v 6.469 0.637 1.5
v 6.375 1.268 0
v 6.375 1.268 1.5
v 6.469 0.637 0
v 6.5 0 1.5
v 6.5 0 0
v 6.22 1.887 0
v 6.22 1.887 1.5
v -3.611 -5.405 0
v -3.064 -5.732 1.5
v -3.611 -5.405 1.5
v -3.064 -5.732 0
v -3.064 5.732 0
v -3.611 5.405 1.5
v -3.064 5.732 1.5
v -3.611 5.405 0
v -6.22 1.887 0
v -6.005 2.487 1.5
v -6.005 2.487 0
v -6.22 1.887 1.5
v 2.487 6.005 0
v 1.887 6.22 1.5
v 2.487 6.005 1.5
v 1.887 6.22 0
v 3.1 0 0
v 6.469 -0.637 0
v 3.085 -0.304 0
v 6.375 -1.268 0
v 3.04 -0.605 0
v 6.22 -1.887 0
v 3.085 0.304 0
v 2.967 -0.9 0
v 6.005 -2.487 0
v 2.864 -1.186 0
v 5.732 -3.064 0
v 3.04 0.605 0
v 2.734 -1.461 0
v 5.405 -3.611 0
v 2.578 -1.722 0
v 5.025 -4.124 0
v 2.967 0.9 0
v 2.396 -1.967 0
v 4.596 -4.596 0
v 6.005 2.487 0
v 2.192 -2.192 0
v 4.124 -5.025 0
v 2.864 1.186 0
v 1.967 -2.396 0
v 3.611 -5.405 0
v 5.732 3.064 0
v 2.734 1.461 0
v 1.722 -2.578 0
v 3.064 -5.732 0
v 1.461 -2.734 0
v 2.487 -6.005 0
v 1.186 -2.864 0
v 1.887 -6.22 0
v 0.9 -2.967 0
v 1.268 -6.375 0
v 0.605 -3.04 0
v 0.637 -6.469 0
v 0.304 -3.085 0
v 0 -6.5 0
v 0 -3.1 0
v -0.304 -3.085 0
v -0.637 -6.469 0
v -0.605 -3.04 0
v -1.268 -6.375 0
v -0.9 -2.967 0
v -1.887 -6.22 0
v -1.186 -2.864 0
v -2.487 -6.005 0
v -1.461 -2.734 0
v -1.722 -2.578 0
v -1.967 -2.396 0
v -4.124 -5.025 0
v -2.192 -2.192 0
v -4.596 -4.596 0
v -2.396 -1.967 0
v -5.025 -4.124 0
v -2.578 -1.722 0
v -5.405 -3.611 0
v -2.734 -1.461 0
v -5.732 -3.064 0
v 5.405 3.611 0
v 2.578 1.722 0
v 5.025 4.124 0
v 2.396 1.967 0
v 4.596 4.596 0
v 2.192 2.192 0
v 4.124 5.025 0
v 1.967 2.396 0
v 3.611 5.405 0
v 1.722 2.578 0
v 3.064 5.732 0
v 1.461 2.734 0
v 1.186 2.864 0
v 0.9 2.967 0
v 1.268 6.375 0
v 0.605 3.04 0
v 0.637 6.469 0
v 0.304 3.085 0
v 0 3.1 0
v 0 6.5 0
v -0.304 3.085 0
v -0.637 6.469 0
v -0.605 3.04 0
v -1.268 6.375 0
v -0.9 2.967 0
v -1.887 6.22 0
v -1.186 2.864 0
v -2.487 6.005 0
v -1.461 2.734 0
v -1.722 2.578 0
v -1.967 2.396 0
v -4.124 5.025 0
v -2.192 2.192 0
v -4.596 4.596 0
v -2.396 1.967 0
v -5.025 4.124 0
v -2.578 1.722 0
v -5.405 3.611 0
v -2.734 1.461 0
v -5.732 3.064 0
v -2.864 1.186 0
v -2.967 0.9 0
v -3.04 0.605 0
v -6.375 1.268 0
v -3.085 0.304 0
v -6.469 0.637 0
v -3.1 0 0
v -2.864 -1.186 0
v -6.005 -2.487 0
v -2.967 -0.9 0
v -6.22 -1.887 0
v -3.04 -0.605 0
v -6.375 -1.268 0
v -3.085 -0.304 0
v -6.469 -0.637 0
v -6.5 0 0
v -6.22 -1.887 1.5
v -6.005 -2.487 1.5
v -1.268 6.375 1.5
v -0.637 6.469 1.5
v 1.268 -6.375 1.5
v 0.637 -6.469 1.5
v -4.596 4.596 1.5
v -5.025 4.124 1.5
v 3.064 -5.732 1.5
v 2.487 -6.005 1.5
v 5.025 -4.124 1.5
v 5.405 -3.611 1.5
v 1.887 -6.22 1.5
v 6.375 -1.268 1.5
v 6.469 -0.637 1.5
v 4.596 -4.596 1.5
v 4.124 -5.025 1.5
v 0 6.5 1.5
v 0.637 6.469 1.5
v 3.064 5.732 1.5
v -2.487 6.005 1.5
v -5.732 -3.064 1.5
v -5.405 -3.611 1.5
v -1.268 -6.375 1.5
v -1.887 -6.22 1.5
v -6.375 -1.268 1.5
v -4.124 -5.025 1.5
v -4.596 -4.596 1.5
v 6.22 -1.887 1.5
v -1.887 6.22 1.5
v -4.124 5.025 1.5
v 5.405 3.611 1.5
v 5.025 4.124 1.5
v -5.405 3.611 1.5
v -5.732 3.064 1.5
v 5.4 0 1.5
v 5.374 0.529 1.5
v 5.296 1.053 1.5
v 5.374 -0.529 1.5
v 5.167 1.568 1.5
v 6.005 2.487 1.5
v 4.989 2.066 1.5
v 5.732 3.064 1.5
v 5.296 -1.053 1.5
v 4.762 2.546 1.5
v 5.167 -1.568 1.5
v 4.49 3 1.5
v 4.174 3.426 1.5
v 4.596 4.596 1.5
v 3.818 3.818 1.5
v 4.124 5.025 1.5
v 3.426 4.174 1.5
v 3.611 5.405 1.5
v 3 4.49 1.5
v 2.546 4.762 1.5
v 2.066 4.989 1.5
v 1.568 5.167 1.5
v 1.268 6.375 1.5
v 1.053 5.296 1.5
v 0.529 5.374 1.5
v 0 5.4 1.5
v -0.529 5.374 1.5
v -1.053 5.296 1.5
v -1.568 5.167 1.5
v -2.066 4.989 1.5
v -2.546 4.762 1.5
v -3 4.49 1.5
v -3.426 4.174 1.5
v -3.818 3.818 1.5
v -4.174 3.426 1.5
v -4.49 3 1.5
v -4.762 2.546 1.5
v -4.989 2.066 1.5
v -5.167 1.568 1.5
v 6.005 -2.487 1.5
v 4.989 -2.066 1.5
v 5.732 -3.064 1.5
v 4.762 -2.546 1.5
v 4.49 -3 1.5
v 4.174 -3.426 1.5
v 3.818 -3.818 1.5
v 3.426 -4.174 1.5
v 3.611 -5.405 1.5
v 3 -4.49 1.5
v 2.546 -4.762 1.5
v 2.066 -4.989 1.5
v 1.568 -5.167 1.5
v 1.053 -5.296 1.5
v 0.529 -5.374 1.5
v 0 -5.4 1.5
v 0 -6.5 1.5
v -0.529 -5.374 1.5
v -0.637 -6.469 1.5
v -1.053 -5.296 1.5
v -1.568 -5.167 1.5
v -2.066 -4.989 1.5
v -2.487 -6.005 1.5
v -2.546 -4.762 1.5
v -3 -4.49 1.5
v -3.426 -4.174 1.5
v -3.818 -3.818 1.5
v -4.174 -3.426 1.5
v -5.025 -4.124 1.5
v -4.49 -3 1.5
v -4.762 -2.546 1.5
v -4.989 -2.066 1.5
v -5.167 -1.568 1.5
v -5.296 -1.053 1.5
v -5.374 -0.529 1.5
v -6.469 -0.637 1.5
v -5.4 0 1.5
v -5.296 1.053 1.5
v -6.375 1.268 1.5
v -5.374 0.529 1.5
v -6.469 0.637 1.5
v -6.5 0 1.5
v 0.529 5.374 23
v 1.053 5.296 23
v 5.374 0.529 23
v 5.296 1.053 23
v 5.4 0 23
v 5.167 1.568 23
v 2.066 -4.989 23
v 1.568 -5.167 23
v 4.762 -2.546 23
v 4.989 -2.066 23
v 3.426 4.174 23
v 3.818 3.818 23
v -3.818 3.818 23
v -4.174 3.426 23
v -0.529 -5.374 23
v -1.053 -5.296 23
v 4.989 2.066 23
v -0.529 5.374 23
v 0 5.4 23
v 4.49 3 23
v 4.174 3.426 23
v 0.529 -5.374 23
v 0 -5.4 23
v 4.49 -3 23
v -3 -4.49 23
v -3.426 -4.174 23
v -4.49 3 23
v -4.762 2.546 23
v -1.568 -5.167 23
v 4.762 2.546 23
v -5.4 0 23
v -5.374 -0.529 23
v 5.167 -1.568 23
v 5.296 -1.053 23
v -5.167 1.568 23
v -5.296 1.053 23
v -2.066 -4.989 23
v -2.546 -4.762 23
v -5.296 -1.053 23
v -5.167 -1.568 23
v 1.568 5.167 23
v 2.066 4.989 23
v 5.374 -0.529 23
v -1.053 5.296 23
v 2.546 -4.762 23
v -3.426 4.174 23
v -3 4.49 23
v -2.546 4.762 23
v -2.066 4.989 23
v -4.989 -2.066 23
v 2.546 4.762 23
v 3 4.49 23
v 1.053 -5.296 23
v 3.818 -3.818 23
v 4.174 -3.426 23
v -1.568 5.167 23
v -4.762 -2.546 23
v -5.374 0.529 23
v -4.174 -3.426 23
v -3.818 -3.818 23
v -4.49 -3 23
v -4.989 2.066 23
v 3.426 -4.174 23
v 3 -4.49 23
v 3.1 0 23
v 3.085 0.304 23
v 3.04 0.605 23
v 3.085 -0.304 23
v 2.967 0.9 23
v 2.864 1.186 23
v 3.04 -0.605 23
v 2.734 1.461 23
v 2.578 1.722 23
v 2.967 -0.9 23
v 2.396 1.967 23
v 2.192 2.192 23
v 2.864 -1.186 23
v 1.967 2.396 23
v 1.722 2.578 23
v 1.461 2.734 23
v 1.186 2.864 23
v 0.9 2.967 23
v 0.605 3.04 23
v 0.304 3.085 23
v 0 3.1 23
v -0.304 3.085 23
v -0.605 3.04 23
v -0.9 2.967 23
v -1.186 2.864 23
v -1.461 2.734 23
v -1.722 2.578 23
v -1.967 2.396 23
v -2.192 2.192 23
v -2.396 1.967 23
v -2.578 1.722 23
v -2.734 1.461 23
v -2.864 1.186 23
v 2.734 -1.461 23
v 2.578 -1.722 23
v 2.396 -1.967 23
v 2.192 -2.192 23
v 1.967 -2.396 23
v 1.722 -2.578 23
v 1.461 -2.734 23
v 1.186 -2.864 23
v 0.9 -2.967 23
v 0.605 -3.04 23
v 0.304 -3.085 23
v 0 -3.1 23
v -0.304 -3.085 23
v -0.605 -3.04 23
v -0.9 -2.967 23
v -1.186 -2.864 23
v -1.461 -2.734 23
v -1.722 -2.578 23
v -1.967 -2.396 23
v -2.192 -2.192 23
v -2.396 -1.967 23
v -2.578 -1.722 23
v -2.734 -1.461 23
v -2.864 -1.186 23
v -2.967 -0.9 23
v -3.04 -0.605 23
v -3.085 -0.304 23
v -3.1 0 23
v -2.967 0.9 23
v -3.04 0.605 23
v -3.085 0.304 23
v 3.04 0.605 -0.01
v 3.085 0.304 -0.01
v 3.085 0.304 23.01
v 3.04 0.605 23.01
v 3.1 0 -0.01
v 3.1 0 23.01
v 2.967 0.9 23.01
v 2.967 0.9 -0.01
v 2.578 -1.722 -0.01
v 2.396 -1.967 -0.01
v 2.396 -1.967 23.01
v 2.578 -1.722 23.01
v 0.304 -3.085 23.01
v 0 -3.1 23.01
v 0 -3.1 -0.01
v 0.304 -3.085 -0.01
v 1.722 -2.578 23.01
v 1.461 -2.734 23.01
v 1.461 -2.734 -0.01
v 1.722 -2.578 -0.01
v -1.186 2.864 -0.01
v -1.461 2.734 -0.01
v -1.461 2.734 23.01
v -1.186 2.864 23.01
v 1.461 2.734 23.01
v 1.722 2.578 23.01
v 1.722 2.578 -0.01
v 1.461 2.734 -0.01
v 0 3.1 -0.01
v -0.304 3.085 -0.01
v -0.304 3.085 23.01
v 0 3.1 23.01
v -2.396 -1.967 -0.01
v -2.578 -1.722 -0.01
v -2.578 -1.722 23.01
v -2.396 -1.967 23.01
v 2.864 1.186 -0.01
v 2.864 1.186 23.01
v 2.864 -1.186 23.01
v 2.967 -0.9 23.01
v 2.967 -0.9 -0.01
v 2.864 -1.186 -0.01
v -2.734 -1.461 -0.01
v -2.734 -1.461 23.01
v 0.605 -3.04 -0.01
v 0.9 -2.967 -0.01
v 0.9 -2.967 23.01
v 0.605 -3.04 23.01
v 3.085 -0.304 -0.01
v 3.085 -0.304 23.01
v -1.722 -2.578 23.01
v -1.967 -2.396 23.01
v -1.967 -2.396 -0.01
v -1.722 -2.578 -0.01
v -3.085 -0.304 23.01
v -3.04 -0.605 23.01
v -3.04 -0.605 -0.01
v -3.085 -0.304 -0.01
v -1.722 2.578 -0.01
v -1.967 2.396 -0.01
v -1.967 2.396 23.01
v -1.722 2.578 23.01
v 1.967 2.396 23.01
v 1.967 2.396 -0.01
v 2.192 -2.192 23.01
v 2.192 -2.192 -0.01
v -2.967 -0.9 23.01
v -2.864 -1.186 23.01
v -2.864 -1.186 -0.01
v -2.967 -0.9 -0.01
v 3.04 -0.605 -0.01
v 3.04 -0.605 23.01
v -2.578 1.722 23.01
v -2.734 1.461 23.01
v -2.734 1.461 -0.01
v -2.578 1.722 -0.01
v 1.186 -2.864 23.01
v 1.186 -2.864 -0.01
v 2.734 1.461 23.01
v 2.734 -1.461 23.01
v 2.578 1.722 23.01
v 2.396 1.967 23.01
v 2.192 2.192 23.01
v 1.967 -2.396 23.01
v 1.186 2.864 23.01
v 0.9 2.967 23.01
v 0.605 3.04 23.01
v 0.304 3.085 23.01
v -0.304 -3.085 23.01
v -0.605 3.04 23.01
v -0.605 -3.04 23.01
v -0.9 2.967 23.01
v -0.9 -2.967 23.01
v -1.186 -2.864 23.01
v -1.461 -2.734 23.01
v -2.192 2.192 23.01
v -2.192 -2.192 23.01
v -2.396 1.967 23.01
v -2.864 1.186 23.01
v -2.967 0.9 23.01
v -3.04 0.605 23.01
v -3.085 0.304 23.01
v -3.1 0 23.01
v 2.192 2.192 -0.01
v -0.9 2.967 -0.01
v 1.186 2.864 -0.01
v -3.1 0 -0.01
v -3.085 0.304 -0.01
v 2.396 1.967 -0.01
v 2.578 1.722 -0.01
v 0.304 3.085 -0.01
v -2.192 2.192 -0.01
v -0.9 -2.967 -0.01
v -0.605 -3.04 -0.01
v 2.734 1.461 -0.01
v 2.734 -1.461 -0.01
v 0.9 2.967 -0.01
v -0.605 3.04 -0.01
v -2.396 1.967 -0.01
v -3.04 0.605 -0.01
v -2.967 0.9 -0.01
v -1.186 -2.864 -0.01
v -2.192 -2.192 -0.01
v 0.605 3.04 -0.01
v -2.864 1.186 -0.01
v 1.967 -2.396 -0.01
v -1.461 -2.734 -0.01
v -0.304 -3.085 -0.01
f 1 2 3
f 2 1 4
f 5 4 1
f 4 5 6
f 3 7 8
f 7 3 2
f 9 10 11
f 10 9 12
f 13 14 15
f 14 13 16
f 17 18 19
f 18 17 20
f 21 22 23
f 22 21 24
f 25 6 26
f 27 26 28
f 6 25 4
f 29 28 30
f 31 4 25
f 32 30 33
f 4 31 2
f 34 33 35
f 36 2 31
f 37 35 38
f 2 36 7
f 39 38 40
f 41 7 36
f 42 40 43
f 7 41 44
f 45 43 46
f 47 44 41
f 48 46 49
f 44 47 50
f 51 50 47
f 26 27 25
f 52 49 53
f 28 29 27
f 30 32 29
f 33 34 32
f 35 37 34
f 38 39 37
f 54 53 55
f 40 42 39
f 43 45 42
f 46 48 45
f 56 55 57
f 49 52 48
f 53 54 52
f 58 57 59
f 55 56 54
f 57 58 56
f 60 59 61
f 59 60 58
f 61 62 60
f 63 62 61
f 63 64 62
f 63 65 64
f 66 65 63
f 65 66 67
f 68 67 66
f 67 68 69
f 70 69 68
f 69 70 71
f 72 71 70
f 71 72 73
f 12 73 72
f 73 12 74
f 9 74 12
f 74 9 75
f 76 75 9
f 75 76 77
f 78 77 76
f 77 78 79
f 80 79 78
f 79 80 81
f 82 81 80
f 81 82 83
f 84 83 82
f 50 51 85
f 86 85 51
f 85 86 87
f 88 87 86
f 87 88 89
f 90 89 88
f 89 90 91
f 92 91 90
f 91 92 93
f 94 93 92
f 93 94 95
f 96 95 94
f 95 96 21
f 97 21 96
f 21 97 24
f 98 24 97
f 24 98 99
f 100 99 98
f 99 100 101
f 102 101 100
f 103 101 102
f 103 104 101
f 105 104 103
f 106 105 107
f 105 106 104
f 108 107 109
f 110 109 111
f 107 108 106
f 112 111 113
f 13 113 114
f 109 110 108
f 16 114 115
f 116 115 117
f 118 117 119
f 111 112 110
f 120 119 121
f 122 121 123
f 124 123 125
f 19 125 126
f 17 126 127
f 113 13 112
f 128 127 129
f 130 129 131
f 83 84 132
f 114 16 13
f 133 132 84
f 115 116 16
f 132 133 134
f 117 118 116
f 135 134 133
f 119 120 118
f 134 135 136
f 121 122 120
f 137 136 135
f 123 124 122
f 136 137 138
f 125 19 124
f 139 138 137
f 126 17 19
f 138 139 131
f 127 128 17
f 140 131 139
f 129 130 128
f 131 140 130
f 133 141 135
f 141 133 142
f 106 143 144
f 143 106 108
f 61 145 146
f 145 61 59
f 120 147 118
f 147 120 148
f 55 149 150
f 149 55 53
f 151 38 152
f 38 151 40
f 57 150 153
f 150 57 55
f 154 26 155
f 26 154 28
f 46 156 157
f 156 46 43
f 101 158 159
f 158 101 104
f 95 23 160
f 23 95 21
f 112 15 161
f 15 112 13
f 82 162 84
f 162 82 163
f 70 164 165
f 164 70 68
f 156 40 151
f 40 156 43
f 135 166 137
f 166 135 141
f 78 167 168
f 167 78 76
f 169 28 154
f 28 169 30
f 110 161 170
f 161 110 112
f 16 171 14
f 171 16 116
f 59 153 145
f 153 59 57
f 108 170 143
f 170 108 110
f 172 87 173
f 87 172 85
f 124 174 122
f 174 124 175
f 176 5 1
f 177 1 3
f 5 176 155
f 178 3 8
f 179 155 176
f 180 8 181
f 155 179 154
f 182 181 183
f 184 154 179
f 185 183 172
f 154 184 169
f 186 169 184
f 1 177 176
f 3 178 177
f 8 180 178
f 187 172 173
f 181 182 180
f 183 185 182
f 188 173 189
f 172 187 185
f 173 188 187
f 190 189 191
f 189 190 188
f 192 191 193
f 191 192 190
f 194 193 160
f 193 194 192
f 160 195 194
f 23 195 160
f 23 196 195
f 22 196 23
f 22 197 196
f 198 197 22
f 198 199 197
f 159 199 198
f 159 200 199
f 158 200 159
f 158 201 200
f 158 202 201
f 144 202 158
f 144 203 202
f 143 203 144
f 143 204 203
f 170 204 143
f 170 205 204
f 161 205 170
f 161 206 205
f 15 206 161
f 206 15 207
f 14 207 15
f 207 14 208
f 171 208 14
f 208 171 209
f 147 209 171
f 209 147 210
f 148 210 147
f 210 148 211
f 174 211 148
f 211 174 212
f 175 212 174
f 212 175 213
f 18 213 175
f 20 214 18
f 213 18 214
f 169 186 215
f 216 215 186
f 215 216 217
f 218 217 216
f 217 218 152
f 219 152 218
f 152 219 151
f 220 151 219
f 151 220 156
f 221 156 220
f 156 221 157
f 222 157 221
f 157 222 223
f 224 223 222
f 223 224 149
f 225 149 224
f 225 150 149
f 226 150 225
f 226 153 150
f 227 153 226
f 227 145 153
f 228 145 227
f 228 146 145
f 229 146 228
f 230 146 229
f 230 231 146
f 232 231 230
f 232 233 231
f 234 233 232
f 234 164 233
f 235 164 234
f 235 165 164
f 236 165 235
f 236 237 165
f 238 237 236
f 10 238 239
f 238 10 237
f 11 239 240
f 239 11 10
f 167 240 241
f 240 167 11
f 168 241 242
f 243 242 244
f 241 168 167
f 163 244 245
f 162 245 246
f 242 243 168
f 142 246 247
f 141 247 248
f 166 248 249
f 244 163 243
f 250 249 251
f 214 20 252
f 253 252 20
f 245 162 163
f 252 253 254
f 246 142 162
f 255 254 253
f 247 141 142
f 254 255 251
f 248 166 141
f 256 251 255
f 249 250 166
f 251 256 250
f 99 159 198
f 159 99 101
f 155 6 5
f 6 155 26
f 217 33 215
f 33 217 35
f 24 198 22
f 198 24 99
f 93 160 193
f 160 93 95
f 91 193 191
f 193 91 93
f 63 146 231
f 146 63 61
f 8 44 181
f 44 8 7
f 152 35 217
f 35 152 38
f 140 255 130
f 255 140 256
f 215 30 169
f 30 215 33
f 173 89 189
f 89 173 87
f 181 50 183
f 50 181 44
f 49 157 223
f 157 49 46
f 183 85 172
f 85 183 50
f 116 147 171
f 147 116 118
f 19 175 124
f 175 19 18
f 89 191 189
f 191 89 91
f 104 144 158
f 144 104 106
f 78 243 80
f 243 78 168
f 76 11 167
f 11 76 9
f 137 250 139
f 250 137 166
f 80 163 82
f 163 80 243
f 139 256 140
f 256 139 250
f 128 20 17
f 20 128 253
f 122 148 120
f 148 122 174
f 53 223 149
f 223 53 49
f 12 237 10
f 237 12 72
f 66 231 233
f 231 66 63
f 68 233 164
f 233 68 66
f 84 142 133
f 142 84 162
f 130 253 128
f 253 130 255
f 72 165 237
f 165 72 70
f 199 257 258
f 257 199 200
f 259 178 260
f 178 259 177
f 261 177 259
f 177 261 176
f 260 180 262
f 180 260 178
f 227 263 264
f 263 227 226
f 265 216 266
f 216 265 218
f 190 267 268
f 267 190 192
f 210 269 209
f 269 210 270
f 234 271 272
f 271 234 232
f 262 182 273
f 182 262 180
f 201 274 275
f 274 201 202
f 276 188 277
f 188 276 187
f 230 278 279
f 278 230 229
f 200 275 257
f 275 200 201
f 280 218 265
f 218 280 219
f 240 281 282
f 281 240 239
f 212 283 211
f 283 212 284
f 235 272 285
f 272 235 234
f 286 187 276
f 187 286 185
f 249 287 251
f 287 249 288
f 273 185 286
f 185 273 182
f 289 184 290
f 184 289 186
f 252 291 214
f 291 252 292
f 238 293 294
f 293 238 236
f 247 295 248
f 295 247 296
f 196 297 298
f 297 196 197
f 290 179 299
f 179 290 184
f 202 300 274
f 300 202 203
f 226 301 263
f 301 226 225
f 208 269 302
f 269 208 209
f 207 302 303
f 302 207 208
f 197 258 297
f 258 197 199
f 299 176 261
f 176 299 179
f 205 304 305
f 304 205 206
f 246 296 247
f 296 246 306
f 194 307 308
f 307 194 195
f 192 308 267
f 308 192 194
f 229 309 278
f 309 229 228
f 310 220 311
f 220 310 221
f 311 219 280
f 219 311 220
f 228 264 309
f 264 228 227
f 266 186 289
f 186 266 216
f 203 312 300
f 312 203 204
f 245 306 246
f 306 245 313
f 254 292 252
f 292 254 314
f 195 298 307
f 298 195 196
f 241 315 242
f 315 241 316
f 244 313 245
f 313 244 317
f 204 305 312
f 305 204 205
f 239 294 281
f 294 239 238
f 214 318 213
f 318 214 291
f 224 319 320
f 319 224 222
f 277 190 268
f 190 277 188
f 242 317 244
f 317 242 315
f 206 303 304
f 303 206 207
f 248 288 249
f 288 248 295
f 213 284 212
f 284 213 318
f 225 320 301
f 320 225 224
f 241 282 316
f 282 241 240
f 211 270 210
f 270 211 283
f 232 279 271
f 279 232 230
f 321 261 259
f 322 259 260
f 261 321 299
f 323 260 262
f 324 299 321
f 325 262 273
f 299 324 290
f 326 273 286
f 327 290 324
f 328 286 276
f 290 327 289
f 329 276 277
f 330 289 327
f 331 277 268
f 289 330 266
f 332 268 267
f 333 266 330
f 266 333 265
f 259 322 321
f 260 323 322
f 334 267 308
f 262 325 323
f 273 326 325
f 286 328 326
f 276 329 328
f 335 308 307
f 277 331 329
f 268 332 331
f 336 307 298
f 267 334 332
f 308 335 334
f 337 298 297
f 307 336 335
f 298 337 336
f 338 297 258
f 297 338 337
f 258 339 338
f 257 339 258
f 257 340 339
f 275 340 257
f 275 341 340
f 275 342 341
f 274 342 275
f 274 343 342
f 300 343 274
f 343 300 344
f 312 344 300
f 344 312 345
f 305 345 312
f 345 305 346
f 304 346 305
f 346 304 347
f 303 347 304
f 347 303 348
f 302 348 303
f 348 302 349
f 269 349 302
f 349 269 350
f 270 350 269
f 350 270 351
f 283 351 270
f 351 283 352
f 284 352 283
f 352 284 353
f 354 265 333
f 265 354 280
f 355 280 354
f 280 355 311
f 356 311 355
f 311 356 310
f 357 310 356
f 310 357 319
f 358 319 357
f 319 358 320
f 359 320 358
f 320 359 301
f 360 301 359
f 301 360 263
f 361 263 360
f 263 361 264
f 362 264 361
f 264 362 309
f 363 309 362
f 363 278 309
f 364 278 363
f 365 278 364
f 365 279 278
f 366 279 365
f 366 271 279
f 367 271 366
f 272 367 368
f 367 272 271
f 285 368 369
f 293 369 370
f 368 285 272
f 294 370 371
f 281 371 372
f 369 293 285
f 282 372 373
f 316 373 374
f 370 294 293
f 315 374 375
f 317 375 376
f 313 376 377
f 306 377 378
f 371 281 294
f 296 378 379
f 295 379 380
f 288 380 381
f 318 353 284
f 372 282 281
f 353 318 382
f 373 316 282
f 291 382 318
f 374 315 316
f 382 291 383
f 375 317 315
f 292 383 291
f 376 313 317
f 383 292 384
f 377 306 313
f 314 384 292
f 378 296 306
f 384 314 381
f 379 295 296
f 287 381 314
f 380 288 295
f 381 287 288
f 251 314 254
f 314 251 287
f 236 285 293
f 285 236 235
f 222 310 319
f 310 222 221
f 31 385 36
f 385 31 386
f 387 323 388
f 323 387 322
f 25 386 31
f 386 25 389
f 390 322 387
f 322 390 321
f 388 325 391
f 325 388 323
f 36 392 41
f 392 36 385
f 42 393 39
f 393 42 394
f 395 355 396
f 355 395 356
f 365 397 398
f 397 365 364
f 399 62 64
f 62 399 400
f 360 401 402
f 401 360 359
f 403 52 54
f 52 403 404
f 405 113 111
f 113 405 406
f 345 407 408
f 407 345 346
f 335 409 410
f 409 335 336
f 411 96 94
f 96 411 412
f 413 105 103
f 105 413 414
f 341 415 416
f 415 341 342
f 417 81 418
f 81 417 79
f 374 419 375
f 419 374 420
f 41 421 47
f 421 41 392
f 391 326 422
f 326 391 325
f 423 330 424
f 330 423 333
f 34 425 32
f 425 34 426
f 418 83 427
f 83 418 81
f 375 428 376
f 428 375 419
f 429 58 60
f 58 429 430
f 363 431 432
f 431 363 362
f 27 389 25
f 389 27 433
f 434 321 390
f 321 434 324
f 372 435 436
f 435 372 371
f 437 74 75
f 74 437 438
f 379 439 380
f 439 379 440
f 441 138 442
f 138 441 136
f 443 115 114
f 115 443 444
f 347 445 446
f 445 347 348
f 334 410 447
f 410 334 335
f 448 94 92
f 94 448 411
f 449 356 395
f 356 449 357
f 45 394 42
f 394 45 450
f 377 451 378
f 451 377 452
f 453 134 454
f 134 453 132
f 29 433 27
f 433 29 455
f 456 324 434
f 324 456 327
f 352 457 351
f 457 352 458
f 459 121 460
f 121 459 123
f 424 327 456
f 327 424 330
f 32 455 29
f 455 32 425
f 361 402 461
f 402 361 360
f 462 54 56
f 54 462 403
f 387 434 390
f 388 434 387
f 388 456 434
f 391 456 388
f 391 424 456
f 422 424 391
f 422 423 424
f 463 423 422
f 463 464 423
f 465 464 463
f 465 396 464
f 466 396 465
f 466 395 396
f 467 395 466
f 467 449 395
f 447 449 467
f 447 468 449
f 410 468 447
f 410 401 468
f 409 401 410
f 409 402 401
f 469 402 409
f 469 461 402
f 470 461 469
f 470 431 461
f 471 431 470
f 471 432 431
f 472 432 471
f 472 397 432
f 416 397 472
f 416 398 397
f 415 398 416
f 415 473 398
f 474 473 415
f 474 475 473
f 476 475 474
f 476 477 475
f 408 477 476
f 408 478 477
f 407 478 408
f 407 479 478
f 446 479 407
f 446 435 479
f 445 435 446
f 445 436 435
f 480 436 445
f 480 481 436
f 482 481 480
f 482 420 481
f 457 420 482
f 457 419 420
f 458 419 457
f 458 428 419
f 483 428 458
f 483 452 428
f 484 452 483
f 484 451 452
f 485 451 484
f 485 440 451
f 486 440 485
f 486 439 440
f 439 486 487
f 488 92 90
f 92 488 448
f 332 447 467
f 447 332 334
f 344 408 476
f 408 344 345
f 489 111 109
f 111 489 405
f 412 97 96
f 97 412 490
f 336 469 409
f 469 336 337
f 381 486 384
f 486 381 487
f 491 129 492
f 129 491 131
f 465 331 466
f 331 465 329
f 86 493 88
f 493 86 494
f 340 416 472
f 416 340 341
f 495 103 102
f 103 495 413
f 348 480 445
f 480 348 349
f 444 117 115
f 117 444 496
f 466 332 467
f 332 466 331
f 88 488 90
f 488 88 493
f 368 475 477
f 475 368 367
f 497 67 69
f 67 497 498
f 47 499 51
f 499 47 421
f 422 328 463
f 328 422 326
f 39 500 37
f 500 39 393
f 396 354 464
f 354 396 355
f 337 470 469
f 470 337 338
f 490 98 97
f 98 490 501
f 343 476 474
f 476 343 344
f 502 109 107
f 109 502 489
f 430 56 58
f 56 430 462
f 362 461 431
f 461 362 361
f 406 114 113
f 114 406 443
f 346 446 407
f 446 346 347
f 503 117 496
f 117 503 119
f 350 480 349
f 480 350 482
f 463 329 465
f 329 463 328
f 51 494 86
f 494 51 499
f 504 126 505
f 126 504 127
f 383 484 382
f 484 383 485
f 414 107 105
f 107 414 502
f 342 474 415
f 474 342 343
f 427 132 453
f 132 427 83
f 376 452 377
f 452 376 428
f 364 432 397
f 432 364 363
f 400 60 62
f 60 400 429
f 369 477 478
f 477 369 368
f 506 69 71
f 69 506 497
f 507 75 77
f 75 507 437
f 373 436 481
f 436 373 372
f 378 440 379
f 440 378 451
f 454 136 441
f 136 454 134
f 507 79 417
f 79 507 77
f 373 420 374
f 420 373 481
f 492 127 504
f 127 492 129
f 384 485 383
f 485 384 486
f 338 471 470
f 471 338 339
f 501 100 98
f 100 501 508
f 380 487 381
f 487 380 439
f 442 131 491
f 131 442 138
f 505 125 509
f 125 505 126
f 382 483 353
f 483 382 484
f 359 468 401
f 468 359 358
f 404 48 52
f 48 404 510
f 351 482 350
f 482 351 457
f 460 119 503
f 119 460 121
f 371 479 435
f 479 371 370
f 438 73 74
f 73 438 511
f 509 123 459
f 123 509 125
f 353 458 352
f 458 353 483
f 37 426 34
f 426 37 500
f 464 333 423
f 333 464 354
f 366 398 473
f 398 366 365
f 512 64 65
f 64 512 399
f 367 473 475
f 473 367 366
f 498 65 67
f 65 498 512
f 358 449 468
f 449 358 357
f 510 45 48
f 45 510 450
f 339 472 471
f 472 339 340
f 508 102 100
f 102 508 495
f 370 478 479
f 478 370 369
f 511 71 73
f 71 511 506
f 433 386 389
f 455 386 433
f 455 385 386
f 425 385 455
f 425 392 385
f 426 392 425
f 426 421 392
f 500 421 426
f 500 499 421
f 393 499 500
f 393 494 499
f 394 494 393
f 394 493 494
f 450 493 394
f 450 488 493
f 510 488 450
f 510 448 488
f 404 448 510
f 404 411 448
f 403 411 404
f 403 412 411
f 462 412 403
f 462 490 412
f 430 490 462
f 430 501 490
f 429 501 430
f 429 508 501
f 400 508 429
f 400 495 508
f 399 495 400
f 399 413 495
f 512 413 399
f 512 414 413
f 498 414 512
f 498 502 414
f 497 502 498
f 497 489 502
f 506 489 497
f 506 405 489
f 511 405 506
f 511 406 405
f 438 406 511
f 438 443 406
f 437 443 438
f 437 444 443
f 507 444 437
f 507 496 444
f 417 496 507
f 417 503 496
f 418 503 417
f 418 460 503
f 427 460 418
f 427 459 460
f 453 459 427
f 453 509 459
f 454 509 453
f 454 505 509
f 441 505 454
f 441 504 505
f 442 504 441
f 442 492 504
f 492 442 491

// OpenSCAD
// Adapter sleeve for 0.2 mL PCR tube in 1.5 mL rack hole
// Print orientation: upside down (collar on bed)

$fn = 64;

// Dimensions
collar_diameter = 13;       // mm
collar_thickness = 1.5;     // mm
sleeve_outer_diameter = 10.8; // mm
sleeve_height = 21.5;       // mm
bore_diameter = 6.2;        // mm

// Calculate radii
collar_radius = collar_diameter / 2;
sleeve_outer_radius = sleeve_outer_diameter / 2;
bore_radius = bore_diameter / 2;

// Total height of the adapter
total_height = collar_thickness + sleeve_height;

// Build the adapter
module adapter_sleeve() {
    // Collar (bottom part)
    translate([0, 0, 0]) {
        cylinder(h = collar_thickness, r = collar_radius, center = false);
    }
    
    // Sleeve body (upper part)
    translate([0, 0, collar_thickness]) {
        cylinder(h = sleeve_height, r = sleeve_outer_radius, center = false);
    }
    
    // Bore (through-hole)
    translate([0, 0, -0.01]) {
        cylinder(h = total_height + 0.02, r = bore_radius, center = false);
    }
}

// Render the adapter
adapter_sleeve();
